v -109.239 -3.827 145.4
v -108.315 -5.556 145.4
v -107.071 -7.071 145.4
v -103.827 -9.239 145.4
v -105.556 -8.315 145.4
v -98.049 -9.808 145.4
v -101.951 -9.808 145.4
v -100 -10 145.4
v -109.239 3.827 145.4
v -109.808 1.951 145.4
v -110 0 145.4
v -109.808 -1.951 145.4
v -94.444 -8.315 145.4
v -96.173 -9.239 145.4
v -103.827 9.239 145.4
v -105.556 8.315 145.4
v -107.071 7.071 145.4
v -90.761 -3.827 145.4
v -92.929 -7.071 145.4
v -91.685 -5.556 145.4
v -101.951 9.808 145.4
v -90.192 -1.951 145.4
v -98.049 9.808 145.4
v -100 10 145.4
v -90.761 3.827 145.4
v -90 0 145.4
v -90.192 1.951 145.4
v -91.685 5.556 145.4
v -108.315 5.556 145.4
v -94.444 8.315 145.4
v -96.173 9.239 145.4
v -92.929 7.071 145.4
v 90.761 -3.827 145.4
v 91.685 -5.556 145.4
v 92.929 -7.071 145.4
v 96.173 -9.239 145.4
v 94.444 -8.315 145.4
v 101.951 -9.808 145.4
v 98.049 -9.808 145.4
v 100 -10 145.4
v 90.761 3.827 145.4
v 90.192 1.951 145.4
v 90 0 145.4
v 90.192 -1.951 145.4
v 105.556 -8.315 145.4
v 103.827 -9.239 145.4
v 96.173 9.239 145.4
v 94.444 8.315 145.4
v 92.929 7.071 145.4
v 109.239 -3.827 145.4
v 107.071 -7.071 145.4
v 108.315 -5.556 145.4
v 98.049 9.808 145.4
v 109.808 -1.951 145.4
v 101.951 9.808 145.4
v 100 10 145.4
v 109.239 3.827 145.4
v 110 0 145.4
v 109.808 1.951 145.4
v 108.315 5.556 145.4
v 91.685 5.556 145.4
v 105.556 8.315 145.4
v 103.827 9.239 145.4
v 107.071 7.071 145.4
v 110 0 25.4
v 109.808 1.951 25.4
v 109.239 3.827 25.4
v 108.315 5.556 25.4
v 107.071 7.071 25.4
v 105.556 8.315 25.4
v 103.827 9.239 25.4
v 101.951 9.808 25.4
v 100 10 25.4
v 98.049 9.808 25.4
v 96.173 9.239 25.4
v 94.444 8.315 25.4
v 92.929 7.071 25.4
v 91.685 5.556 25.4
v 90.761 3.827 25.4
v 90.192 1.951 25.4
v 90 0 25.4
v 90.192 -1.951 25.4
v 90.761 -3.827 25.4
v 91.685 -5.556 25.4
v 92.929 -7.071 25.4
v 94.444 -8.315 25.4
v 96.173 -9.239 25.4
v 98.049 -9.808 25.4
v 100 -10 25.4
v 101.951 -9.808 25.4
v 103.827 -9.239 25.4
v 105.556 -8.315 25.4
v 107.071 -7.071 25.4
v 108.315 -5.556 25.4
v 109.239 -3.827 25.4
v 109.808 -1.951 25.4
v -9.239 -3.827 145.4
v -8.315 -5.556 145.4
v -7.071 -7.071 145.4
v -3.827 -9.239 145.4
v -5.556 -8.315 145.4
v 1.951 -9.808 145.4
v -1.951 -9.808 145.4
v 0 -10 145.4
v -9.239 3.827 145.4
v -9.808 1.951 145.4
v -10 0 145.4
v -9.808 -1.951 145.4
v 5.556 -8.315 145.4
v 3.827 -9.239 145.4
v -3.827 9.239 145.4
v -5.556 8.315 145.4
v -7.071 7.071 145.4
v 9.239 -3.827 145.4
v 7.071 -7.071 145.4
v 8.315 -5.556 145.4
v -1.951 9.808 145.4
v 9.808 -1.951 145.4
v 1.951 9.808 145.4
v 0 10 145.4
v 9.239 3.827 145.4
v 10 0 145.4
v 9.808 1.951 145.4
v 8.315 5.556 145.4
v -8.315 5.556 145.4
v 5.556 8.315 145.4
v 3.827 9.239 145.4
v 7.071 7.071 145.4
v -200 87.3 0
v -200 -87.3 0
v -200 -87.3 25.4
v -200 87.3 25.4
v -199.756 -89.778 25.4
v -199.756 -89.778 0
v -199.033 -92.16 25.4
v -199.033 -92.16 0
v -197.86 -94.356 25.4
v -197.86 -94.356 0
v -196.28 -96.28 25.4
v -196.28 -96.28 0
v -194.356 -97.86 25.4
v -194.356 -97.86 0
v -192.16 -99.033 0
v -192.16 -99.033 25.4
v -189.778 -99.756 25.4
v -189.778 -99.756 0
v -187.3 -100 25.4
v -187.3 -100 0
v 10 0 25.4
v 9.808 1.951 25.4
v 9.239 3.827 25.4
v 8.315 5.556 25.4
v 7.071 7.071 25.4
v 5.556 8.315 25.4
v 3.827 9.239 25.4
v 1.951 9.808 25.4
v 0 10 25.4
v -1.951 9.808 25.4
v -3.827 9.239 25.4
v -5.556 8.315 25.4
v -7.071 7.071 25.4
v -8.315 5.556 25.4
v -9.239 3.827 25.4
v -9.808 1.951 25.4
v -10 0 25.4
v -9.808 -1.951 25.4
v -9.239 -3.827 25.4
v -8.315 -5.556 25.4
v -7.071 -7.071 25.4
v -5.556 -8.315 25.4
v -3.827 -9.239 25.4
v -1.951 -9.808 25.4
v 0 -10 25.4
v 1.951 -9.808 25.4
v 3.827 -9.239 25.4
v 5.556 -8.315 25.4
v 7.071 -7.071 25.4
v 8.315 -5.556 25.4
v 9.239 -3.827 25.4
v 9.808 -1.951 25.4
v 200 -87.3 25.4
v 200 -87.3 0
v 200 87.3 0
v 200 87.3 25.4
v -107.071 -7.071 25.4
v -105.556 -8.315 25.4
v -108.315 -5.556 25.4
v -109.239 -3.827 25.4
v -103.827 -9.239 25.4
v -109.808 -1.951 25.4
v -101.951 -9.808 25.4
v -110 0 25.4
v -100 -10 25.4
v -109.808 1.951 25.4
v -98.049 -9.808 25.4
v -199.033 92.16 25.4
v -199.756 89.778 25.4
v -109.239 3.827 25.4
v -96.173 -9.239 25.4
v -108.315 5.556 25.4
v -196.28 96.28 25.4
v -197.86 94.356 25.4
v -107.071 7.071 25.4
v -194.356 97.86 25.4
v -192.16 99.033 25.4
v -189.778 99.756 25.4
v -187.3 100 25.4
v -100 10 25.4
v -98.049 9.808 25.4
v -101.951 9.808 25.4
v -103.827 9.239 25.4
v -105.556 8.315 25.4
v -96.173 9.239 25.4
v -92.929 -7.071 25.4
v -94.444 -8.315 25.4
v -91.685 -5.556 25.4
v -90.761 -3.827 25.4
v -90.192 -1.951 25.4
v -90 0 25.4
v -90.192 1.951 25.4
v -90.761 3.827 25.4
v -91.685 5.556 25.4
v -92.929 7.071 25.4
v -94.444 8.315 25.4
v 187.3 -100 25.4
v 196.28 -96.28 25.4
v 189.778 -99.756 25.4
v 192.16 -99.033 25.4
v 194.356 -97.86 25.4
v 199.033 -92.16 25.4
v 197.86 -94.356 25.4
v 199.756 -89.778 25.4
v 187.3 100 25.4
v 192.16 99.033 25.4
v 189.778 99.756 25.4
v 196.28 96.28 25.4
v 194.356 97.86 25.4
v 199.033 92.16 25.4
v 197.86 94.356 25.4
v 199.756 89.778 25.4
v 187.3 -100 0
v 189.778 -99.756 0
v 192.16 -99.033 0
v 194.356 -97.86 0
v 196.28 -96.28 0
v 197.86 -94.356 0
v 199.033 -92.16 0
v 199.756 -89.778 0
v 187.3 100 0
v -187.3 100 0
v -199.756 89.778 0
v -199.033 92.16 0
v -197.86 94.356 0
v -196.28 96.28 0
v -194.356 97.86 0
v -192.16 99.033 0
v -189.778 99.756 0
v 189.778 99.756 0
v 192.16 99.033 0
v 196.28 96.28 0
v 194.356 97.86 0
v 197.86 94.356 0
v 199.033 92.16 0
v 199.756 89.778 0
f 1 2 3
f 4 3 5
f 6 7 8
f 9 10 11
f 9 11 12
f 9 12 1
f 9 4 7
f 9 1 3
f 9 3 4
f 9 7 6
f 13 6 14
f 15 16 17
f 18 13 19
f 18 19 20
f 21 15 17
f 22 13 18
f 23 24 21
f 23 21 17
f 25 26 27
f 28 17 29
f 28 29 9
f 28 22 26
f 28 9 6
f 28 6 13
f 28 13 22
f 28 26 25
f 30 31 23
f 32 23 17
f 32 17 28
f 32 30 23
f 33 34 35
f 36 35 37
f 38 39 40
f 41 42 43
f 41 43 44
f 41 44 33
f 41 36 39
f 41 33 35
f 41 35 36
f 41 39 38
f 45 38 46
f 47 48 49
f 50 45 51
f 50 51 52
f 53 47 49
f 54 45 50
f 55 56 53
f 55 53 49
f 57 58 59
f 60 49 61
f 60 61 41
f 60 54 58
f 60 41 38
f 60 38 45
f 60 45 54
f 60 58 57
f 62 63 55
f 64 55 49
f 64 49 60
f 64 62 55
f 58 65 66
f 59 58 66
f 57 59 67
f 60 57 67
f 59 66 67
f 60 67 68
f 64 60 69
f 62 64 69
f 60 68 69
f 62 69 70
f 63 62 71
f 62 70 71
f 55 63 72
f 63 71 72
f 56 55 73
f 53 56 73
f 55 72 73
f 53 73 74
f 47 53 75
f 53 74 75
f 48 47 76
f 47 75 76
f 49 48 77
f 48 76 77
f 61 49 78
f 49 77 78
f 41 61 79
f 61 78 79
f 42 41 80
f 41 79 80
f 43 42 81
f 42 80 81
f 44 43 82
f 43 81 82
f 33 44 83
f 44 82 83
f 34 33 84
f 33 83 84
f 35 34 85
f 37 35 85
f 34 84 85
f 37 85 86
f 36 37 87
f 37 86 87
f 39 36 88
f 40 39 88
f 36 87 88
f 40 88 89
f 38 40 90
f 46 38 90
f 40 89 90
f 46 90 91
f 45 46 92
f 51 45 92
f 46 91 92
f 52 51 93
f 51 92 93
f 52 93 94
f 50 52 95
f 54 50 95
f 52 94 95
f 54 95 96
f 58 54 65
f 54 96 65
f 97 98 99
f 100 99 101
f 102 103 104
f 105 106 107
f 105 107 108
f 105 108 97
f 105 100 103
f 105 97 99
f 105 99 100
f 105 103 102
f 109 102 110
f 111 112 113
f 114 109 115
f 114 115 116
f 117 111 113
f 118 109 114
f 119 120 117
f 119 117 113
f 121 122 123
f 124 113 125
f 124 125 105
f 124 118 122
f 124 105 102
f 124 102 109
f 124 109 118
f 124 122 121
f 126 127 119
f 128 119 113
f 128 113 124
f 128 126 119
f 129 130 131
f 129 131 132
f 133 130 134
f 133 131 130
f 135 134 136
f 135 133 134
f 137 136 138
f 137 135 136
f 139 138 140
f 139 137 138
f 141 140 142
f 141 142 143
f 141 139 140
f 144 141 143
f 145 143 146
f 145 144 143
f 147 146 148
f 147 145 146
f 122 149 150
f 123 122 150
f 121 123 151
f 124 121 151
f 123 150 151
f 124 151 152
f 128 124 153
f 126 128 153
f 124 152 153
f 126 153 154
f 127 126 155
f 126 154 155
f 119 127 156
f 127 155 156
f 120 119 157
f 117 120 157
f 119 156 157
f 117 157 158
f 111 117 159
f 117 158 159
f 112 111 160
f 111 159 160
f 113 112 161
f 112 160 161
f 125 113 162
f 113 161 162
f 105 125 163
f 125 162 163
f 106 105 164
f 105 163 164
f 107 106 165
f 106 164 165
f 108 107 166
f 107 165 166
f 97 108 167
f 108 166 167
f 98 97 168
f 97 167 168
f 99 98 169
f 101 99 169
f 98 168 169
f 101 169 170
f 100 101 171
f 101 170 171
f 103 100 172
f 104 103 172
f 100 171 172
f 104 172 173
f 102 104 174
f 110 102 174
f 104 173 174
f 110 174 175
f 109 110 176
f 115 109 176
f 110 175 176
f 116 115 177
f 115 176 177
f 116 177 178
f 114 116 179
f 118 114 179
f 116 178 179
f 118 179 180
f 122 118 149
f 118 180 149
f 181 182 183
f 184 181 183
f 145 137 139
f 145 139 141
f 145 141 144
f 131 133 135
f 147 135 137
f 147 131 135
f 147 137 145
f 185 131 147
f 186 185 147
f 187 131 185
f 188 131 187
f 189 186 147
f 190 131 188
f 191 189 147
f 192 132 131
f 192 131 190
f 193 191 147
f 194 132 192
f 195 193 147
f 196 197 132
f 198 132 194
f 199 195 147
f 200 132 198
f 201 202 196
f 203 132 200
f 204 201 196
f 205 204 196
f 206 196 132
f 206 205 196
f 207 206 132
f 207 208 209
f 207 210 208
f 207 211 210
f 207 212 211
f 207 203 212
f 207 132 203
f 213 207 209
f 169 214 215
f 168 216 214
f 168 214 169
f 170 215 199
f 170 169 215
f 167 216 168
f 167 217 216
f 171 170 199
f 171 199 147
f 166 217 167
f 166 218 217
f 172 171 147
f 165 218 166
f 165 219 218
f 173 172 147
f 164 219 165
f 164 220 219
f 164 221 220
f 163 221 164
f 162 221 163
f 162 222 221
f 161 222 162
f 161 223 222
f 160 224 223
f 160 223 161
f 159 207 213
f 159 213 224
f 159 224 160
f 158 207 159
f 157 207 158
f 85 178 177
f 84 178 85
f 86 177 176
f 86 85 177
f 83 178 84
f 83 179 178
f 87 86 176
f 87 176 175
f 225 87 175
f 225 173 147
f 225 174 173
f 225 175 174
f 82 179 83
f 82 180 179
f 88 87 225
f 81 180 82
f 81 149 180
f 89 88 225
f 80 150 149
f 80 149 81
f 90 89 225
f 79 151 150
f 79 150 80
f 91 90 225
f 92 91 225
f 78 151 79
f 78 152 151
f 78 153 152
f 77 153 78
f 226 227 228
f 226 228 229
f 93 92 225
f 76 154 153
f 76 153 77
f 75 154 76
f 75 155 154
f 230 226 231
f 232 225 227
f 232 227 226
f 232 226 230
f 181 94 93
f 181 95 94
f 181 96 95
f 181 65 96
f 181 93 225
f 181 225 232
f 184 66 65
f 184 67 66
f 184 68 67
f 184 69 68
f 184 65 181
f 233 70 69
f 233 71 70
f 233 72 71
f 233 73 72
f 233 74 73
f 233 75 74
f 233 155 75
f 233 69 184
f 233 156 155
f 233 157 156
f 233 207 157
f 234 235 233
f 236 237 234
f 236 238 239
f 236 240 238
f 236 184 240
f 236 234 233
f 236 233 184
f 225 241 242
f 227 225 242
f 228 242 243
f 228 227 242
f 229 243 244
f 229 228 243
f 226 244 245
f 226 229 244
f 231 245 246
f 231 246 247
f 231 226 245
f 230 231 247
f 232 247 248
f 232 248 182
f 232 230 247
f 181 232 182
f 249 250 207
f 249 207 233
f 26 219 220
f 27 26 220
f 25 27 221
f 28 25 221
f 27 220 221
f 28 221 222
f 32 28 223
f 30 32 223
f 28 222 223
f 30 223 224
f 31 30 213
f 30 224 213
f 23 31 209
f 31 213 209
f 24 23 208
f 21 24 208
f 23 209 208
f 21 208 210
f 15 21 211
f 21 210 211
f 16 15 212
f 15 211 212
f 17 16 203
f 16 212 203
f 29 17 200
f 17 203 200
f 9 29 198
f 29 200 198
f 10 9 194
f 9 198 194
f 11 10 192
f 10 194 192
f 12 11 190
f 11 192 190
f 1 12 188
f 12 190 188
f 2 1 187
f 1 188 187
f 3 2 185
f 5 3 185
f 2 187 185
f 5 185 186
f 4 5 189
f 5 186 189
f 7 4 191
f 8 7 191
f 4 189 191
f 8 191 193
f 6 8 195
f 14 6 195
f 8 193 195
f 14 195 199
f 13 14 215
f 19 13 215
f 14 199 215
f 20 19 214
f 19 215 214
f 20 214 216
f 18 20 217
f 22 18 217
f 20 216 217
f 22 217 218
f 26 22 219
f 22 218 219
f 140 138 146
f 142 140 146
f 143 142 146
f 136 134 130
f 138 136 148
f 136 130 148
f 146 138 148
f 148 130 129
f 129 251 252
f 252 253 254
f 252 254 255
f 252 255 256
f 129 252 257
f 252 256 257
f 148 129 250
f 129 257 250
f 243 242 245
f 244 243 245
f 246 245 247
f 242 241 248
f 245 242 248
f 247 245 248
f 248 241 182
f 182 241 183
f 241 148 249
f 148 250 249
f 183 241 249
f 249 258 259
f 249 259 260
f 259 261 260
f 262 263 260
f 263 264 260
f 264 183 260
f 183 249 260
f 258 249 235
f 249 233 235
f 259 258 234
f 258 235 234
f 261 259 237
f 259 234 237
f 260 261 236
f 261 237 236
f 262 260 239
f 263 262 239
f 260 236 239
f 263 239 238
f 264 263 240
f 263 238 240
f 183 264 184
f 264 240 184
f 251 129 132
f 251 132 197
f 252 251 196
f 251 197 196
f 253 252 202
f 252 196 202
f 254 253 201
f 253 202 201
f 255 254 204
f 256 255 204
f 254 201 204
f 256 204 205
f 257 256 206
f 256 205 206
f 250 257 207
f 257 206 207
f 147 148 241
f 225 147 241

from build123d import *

# Parameters (mm, degrees)
F0_W     = 400
F0_H     = 200
F1_DEPTH = 25.4
F2_R     = 10
F3_DEPTH = 120
F4_R     = 12.7


with BuildPart() as f1:
    # F0 (on Top) → F1 (new body)
    with BuildSketch(Plane.XY):
        Rectangle(F0_W, F0_H)
    extrude(amount=F1_DEPTH)

    # F2 (on face) → F3 (join)
    with BuildSketch(Plane.XY.offset(25.4)):
        Circle(F2_R)
        with Locations((100, 0)):
            Circle(F2_R)
        with Locations((-100, 0)):
            Circle(F2_R)
    extrude(amount=F3_DEPTH)

    # F4
    f4_edges = [f1.edges().sort_by_distance(p)[0] for p in [
        (200, -100, 12.7),
        (-200, -100, 12.7),
        (-200, 100, 12.7),
        (200, 100, 12.7),
    ]]
    fillet(f4_edges, radius=F4_R)


solid = f1.part
